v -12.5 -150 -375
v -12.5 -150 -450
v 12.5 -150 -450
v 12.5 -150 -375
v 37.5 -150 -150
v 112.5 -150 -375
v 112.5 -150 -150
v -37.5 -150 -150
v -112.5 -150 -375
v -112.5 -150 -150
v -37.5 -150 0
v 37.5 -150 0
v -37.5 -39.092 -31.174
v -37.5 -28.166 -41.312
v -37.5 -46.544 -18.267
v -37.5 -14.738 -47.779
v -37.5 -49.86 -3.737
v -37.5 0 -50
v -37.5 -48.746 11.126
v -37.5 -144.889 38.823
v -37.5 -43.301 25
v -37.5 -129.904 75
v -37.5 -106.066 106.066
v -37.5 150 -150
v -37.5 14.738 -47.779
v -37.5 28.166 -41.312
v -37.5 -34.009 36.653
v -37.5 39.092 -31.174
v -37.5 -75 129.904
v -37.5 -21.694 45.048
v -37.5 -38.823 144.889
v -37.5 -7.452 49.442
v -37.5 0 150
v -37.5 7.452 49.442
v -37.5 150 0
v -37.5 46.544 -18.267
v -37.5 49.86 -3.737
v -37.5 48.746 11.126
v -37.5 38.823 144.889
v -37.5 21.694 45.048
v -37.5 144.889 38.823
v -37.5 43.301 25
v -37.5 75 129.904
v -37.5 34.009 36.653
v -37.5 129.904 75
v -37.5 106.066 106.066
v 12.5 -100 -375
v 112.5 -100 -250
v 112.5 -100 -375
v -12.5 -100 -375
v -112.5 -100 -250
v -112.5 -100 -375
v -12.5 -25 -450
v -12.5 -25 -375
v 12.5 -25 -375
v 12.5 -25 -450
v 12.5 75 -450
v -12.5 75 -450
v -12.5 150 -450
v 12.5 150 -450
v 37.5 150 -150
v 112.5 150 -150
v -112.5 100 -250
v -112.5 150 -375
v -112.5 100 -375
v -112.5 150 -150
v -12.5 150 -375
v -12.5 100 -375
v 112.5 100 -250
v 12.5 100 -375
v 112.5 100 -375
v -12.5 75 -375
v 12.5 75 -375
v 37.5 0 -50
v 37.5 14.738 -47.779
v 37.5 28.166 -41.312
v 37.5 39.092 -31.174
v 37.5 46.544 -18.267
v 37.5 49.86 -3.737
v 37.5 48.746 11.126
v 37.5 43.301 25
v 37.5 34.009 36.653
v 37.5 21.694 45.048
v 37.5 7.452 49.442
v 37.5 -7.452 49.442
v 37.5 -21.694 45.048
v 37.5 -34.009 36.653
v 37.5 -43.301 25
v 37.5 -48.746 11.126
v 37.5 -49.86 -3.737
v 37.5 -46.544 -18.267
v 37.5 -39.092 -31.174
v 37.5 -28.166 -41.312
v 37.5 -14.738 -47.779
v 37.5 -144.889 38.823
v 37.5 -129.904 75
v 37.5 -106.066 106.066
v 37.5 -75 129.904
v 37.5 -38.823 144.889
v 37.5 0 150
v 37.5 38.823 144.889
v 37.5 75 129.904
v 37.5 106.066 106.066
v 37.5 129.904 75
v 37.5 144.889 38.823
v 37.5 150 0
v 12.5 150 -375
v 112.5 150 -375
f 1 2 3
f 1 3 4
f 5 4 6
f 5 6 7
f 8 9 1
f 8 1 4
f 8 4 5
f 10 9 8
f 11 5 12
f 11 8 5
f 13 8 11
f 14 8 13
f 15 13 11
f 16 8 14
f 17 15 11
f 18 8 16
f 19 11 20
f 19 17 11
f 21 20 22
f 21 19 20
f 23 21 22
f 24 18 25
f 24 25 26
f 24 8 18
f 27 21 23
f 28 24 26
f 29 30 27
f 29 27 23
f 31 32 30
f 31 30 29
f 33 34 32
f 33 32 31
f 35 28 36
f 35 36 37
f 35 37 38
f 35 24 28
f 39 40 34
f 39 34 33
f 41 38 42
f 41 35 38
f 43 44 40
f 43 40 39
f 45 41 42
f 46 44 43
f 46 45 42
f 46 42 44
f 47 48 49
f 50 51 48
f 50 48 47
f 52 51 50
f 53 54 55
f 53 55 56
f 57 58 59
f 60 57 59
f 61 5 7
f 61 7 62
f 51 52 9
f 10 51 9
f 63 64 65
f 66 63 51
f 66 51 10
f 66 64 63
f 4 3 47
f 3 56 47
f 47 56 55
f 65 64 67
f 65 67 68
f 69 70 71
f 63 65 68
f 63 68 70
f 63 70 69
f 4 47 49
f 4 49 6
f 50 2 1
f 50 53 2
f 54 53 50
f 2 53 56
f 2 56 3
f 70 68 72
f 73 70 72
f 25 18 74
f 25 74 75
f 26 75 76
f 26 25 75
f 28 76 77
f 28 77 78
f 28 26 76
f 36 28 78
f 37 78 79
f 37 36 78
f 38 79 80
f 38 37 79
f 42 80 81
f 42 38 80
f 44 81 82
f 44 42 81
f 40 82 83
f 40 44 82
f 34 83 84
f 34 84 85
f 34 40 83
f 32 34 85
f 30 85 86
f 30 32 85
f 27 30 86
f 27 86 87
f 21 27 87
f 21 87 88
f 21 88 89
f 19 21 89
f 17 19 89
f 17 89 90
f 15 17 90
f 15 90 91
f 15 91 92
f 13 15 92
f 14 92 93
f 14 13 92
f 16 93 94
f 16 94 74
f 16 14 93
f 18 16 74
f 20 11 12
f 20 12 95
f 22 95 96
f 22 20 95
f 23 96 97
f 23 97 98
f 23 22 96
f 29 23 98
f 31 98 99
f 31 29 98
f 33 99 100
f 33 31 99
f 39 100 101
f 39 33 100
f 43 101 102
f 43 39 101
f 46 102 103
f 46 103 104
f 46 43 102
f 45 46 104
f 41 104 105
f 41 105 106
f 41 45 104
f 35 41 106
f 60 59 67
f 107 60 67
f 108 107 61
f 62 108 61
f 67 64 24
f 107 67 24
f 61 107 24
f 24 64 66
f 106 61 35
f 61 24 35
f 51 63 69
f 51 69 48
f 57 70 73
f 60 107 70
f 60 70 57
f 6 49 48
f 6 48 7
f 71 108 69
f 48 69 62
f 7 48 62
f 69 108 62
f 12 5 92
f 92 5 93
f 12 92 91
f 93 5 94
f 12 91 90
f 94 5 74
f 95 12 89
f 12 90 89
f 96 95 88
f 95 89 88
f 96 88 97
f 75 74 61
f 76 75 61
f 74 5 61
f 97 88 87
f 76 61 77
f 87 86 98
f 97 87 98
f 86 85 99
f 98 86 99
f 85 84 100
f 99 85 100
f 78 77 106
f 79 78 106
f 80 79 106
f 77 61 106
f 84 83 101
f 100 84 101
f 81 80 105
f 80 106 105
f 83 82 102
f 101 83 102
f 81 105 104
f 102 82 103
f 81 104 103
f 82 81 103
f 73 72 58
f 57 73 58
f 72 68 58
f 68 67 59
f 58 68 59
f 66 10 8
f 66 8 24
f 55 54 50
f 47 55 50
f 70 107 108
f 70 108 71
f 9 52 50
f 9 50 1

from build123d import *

# Parameters (mm, degrees)
BOSS_EXTRUDE1_DEPTH      = 37.5
BOSS_EXTRUDE1_DEPTH_BACK = 37.5
SKETCH2_R                = 50
BOSS_EXTRUDE2_DEPTH      = 112.5
BOSS_EXTRUDE2_DEPTH_BACK = 112.5
BOSS_EXTRUDE3_DEPTH      = 12.5
BOSS_EXTRUDE3_DEPTH_BACK = 12.5
BOSS_EXTRUDE4_DEPTH      = 12.5
BOSS_EXTRUDE4_DEPTH_BACK = 12.5


with BuildPart() as part:
    # Sketch2 → Boss-Extrude1 (new, two sides: drawn at the far end of the back side and taken through both)
    with BuildSketch(Plane(origin=(0, 0, 0), x_dir=(0, 0, -1), z_dir=(1, 0, 0)).offset(-BOSS_EXTRUDE1_DEPTH_BACK)):
        with BuildLine():
            Line((150, 150), (0, 150))
            ThreePointArc((0, 150), (-150, 0), (0, -150))
            Line((0, -150), (150, -150))
            Line((150, -150), (150, 150))
        make_face()
        Circle(SKETCH2_R, mode=Mode.SUBTRACT)
    extrude(amount=BOSS_EXTRUDE1_DEPTH + BOSS_EXTRUDE1_DEPTH_BACK)

    # Sketch2<12> → Boss-Extrude2 (add, two sides: drawn at the far end of the back side and taken through both)
    with BuildSketch(Plane(origin=(0, 0, 0), x_dir=(0, 0, -1), z_dir=(1, 0, 0)).offset(-BOSS_EXTRUDE2_DEPTH_BACK)):
        Polygon((375, 150), (150, 150), (150, -150), (375, -150), (375, -100), (250, -100), (250, 100), (375, 100), align=None)
    extrude(amount=BOSS_EXTRUDE2_DEPTH + BOSS_EXTRUDE2_DEPTH_BACK)

    # Sketch2<13> → Boss-Extrude3 (add, two sides: drawn at the far end of the back side and taken through both)
    with BuildSketch(Plane(origin=(0, 0, 0), x_dir=(0, 0, -1), z_dir=(1, 0, 0)).offset(-BOSS_EXTRUDE3_DEPTH_BACK)):
        Polygon((450, 150), (375, 150), (375, 100), (375, 75), (450, 75), align=None)
    extrude(amount=BOSS_EXTRUDE3_DEPTH + BOSS_EXTRUDE3_DEPTH_BACK)

    # Sketch2<14> → Boss-Extrude4 (add, two sides: drawn at the far end of the back side and taken through both)
    with BuildSketch(Plane(origin=(0, 0, 0), x_dir=(0, 0, -1), z_dir=(1, 0, 0)).offset(-BOSS_EXTRUDE4_DEPTH_BACK)):
        Polygon((375, -100), (375, -150), (450, -150), (450, -25), (375, -25), align=None)
    extrude(amount=BOSS_EXTRUDE4_DEPTH + BOSS_EXTRUDE4_DEPTH_BACK)


solid = part.part
